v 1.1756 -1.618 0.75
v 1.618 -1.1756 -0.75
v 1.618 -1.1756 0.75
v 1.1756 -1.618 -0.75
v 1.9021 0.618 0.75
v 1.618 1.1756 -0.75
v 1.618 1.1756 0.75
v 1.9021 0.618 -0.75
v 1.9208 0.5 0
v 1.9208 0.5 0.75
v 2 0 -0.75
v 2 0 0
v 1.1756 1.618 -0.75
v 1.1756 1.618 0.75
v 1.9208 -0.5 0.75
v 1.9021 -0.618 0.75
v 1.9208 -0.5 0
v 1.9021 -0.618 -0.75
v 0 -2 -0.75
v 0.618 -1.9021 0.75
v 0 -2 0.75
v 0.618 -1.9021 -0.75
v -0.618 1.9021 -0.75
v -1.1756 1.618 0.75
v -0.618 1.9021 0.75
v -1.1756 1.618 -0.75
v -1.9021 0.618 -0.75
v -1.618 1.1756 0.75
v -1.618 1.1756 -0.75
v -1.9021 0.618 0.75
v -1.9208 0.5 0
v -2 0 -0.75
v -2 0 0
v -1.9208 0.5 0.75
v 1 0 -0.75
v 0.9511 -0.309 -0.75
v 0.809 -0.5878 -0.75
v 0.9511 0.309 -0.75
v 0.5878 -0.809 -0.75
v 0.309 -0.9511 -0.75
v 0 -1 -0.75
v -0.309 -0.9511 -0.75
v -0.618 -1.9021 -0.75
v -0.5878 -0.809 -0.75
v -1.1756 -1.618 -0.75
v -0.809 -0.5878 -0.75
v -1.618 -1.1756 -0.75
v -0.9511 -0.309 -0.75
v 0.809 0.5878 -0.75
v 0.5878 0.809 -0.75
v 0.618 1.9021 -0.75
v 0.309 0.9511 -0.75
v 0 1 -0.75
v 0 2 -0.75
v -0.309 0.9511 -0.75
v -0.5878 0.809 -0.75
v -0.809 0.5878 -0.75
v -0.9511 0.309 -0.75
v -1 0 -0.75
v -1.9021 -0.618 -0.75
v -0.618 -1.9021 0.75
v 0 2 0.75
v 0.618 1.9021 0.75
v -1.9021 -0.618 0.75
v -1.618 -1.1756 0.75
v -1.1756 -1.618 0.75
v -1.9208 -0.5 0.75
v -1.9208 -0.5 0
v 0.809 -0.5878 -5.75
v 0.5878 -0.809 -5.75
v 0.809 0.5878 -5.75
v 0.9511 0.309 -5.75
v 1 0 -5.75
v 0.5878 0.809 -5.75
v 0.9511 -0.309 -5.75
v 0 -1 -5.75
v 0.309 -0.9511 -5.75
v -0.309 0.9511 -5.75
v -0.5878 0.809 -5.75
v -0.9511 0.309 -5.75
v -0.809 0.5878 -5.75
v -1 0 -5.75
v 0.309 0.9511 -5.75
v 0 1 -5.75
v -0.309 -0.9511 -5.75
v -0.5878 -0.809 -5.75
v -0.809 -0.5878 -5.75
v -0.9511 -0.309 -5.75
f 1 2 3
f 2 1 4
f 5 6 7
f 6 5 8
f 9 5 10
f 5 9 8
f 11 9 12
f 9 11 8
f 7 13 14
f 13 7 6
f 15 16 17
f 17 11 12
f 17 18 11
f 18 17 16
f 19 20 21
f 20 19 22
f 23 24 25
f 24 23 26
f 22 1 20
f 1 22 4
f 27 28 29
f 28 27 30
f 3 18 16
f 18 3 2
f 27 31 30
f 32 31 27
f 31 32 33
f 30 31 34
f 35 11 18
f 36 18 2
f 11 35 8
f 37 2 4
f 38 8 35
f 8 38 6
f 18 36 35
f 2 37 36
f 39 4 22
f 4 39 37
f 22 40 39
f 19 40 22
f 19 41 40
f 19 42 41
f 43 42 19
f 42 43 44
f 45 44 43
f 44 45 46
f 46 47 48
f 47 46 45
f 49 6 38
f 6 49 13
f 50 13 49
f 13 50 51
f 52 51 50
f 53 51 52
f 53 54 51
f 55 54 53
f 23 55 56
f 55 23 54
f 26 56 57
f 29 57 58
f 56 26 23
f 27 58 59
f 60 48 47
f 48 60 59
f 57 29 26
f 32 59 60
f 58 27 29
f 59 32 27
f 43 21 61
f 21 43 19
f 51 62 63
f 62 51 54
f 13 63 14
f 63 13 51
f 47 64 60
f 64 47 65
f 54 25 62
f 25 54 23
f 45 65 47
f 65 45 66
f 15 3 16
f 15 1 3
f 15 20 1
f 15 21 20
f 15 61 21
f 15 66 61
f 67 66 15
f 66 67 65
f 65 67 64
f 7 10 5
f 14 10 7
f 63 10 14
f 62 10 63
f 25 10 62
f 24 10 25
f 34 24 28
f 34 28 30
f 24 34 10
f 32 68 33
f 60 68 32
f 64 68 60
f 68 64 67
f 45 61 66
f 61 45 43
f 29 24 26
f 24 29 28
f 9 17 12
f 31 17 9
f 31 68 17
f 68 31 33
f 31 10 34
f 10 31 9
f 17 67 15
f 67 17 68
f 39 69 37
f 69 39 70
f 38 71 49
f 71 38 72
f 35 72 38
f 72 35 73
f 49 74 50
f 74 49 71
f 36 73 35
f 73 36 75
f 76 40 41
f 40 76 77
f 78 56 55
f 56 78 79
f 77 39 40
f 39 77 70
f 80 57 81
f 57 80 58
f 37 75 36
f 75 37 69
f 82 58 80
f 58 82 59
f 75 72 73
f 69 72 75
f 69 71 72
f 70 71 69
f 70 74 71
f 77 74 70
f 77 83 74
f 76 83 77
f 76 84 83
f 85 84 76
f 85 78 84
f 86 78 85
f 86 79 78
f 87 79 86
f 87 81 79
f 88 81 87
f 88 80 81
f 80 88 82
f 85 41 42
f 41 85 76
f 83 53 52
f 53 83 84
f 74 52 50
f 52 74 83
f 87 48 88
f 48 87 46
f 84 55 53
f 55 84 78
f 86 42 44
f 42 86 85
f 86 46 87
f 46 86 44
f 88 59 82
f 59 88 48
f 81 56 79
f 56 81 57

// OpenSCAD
drill=2;
length=5;
head_thickness=1.5;
head_diameter=4;


union() {
  translate([0,0,-length/2-head_thickness/2])
  cylinder(h=length, r=drill/2,center=true, $fn=20);

  difference() {
    cylinder(h=head_thickness, r=head_diameter/2, $fn=20, center=true);

     translate([0,0,5])
        cube([head_diameter+2, 1,10],center=true);
  }
}
